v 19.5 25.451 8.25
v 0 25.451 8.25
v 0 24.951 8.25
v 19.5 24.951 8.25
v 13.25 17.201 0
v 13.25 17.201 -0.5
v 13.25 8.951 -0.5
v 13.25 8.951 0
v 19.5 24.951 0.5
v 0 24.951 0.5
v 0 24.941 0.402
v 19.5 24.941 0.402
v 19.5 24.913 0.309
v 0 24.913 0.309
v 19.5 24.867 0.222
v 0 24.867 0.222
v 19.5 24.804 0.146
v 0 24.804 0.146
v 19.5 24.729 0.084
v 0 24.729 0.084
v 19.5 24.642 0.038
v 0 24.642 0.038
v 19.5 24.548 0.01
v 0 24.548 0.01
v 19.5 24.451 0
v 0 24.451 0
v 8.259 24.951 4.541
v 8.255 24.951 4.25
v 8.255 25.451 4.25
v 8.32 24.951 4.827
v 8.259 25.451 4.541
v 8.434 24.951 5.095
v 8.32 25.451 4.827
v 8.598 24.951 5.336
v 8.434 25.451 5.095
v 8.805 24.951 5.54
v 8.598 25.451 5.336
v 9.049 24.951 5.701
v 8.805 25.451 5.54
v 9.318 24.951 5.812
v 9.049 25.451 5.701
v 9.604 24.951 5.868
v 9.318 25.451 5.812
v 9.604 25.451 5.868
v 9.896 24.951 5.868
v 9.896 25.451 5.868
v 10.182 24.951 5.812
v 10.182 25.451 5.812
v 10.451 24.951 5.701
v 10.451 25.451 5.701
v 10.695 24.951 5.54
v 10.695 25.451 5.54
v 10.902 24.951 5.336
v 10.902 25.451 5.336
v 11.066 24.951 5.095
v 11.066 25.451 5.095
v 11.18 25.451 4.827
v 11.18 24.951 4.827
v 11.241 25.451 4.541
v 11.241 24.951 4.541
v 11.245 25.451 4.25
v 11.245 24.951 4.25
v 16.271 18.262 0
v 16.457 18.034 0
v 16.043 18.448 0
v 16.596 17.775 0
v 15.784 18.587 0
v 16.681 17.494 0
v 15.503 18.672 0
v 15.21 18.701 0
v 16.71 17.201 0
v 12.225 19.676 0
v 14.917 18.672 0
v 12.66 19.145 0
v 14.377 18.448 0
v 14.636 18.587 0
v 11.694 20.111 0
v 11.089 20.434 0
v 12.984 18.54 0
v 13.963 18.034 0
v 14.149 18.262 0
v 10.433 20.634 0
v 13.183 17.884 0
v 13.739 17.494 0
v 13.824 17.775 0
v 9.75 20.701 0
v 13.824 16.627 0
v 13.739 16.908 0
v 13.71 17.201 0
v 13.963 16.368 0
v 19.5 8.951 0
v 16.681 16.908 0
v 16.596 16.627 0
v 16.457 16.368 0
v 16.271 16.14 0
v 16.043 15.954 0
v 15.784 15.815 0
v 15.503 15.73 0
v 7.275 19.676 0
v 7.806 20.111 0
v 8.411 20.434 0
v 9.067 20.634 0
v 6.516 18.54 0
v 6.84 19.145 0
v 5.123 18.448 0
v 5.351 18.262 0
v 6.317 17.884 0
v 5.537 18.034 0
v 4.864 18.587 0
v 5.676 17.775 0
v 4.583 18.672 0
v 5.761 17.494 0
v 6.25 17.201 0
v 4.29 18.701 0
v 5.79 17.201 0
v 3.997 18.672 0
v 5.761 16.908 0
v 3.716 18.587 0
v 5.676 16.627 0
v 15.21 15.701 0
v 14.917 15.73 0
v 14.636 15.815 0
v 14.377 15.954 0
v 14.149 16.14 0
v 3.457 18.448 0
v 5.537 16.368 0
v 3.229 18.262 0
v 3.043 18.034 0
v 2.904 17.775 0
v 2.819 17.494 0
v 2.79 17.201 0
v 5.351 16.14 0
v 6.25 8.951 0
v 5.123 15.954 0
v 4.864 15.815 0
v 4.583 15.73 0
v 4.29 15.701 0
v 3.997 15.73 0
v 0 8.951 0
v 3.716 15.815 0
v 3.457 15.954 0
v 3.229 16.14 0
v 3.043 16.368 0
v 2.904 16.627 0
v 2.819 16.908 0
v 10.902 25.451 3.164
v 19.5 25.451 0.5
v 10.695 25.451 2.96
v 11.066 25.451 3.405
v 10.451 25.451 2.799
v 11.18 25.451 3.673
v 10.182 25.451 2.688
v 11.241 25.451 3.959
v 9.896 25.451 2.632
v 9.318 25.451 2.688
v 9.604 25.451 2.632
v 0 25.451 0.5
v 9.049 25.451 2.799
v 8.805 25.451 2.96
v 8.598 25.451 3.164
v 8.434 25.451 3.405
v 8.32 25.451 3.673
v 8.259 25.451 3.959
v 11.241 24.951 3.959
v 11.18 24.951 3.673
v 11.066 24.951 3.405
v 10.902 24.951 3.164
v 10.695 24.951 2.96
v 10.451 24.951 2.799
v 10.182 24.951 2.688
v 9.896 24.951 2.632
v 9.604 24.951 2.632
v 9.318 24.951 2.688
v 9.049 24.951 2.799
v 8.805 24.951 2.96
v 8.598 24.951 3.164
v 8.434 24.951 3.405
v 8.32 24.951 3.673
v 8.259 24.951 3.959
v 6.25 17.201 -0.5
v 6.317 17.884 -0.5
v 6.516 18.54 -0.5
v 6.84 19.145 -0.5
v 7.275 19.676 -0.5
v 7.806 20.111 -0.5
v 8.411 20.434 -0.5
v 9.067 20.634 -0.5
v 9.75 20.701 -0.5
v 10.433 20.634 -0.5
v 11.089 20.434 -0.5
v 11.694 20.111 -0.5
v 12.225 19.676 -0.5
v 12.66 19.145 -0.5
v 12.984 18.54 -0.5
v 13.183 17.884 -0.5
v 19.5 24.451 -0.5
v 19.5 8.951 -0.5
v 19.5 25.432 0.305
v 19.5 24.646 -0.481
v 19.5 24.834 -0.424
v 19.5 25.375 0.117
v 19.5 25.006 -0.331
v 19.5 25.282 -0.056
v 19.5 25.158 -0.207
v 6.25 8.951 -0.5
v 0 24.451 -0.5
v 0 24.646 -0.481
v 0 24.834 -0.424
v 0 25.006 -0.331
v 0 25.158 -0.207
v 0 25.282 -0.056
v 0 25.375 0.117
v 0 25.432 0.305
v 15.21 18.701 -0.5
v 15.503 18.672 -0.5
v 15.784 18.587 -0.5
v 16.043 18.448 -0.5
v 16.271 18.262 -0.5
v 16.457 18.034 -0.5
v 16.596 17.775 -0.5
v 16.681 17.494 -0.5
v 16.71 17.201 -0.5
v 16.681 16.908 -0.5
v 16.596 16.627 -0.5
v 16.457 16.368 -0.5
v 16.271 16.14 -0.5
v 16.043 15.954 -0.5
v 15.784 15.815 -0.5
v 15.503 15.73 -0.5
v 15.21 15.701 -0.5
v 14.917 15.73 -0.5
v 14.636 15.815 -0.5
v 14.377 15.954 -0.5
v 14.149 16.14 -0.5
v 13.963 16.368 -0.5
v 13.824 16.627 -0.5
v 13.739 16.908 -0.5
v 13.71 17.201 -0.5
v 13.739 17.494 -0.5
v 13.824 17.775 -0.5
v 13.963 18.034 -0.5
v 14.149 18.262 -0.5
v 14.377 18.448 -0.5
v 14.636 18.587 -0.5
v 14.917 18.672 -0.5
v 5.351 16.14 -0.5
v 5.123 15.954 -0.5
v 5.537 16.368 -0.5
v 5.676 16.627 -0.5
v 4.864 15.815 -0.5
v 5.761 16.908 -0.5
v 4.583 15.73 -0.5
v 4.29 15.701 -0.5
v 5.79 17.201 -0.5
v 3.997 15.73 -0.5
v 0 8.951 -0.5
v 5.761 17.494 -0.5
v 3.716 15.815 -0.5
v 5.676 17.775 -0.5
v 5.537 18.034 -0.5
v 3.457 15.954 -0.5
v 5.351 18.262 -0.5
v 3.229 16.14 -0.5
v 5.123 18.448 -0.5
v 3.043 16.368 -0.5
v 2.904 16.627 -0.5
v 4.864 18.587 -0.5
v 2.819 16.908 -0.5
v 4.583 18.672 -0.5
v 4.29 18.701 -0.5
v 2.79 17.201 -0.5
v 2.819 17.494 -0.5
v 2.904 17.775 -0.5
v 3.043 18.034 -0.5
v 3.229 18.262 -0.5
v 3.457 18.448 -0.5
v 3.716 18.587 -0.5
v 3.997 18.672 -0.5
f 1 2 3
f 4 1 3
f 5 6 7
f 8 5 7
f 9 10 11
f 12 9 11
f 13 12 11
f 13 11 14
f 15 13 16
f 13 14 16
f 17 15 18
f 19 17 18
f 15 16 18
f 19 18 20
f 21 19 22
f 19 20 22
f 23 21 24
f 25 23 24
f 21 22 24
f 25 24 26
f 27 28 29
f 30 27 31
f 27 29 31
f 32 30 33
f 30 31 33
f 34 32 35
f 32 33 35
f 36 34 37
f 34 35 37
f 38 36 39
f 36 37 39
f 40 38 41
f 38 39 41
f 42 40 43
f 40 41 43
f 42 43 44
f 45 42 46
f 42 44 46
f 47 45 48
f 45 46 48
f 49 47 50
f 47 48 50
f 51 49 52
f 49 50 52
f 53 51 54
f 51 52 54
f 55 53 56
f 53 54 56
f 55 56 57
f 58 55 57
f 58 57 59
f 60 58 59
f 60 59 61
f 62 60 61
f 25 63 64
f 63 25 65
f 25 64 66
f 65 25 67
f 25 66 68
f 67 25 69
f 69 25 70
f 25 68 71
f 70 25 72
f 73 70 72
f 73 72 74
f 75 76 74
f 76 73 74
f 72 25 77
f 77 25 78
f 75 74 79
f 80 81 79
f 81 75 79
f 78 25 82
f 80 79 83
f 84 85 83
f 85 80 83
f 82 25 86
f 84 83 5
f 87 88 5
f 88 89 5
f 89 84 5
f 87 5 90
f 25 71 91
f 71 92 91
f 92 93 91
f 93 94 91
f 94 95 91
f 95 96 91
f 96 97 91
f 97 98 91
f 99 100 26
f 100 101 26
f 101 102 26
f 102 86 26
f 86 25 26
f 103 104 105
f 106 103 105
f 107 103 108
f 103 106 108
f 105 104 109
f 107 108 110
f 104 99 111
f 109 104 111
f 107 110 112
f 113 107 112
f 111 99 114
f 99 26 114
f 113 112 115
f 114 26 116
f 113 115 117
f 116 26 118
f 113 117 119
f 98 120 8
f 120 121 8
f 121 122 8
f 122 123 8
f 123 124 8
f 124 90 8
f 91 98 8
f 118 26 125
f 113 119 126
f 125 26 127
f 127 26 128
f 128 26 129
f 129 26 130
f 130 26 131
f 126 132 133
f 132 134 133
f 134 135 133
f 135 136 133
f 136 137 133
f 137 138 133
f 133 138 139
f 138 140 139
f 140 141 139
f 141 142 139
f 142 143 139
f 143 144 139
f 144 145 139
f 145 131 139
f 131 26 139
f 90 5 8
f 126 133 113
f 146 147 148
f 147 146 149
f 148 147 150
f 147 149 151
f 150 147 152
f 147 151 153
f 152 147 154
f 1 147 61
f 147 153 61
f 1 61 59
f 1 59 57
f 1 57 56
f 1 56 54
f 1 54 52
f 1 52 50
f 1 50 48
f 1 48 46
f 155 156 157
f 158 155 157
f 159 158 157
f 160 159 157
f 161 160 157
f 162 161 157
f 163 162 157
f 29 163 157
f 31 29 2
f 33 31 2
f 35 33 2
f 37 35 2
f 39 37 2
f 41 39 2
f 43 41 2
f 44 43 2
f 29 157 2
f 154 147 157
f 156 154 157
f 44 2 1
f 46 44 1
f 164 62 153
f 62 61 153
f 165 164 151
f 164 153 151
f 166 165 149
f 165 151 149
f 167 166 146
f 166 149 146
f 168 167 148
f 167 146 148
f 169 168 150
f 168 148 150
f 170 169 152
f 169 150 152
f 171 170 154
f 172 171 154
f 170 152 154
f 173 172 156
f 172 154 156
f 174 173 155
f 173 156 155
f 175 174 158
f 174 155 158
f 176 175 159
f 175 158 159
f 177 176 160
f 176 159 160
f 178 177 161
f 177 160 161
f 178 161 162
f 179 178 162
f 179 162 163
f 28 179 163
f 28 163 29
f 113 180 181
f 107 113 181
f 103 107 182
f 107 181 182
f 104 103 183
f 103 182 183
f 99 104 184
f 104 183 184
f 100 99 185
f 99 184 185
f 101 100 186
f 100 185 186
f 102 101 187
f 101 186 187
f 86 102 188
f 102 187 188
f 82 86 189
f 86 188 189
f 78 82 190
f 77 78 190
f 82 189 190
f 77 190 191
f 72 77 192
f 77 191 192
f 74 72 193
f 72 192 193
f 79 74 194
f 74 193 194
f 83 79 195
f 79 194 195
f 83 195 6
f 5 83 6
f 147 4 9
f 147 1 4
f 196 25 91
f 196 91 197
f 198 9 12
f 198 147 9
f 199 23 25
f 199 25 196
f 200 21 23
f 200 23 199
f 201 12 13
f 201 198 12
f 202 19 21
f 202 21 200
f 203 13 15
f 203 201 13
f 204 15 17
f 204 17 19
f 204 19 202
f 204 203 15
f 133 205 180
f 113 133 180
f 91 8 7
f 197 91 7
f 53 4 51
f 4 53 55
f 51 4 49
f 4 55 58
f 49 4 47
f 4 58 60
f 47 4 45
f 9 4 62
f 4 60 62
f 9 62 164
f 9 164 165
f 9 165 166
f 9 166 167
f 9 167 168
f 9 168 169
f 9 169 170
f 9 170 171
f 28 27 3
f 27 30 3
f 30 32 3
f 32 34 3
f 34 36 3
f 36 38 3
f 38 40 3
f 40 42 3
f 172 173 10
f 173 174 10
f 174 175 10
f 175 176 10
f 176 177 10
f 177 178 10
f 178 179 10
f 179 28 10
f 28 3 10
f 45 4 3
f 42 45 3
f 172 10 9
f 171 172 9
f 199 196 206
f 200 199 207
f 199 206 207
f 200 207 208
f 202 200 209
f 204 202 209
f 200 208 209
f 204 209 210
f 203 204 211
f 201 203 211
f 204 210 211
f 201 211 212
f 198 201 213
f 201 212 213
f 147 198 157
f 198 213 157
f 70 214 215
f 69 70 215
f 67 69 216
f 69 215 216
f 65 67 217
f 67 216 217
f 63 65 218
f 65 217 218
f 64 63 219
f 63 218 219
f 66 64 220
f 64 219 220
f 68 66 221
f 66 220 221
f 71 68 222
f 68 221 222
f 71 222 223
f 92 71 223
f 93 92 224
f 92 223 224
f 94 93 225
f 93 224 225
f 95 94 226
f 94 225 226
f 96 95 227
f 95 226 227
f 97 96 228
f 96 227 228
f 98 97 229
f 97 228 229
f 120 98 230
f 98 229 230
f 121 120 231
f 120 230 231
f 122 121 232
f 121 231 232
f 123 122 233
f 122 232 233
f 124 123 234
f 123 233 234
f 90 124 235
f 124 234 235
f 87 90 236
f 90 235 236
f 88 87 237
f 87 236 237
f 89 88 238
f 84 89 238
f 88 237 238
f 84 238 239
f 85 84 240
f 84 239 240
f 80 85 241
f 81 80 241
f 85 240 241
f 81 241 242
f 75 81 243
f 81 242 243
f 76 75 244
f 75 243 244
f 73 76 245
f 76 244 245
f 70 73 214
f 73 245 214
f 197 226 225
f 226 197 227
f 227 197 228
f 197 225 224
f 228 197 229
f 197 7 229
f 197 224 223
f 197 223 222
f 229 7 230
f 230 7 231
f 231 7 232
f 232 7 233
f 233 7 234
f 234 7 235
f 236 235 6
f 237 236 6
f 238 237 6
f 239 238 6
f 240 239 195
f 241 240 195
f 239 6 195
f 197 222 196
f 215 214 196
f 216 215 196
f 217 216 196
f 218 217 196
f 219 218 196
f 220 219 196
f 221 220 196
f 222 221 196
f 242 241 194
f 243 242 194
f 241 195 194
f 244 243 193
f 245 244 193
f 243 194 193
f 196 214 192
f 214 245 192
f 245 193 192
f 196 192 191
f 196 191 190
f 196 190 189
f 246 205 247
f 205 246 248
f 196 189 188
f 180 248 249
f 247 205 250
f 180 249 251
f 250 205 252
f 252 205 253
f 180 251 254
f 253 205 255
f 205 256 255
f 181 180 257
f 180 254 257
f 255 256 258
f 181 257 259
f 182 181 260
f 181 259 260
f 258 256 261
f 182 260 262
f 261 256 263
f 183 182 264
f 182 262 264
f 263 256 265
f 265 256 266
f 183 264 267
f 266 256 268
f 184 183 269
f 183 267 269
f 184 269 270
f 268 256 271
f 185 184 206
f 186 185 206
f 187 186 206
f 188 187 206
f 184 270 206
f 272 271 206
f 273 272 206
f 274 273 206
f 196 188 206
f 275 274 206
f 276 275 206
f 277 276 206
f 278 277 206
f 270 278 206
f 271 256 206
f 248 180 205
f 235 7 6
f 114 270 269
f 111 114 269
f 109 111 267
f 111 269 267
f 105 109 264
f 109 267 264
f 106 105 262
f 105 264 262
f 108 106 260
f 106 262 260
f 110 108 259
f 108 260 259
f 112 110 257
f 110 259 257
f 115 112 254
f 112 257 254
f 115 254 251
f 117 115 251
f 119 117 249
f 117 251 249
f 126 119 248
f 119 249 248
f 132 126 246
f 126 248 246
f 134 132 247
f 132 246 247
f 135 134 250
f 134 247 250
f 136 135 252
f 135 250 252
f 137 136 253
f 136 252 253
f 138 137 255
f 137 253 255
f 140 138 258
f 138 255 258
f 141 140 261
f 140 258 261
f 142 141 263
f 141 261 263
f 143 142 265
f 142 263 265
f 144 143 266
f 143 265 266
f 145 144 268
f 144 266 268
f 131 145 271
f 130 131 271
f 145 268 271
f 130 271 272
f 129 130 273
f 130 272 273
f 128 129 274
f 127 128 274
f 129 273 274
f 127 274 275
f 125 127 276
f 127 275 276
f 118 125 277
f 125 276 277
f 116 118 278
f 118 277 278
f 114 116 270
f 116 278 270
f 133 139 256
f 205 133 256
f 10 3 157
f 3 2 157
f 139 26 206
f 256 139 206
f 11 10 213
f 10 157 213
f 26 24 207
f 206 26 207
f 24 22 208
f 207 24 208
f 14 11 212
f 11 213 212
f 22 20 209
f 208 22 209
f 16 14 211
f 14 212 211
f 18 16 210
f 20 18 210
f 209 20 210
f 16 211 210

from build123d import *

# Parameters (mm, degrees)
BRIDA_BASE1_DEPTH     = 19.5
CROQUIS9_R            = 1.5
CORTAR_EXTRUIR4_DEPTH = 0.5
CROQUIS10_R           = 1.5
CORTAR_EXTRUIR5_DEPTH = 0.5
CROQUIS8_R            = 1.5
CORTAR_EXTRUIR3_DEPTH = 10


# Sheet-metal steps are written as plain solids
with BuildPart() as part:
    # Croquis1 → Brida base1 (new body)
    with BuildSketch(Plane(origin=(0, 0, 0), x_dir=(0, 0, -1), z_dir=(1, 0, 0))):
        with BuildLine():
            Line((-8.25, 24.950879865), (-0.5, 24.950879865))
            ThreePointArc((-0.5, 24.950879865), (-0.146446609, 24.804433255), (0, 24.450879865))
            Line((0, 24.450879865), (0, 8.950879865))
            Line((0, 8.950879865), (0.5, 8.950879865))
            Line((0.5, 8.950879865), (0.5, 24.450879865))
            ThreePointArc((0.5, 24.450879865), (0.207106781, 25.157986646), (-0.5, 25.450879865))
            Line((-0.5, 25.450879865), (-8.25, 25.450879865))
            Line((-8.25, 25.450879865), (-8.25, 24.950879865))
        make_face()
    extrude(amount=BRIDA_BASE1_DEPTH)

    # Croquis9 → Cortar-Extruir4 (cut)
    with BuildSketch(Plane(origin=(0, 0, -0.5), x_dir=(-1, 0, 0), z_dir=(0, 0, -1))):
        with BuildLine():
            ThreePointArc((-6.25, 17.200879865), (-9.75, 20.700879865), (-13.25, 17.200879865))
            Line((-13.25, 17.200879865), (-13.25, 8.950879865))
            Line((-13.25, 8.950879865), (-6.25, 8.950879865))
            Line((-6.25, 8.950879865), (-6.25, 17.200879865))
        make_face()
        with Locations(Location((-15.21, 17.200879865, 0), (0, 0, 90))):
            Circle(CROQUIS9_R)
        with Locations(Location((-4.29, 17.200879865, 0), (0, 0, 90))):
            Circle(CROQUIS9_R)
    extrude(amount=-CORTAR_EXTRUIR4_DEPTH, mode=Mode.SUBTRACT)

    # Croquis10 → Cortar-Extruir5 (cut)
    with BuildSketch(Plane(origin=(0, 25.450879865, 0), x_dir=(1, 0, 0), z_dir=(0, 1, 0))):
        with Locations(Location((9.75, -4.375, 0), (0, 0, 270))):
            Circle(CROQUIS10_R)
    extrude(amount=-CORTAR_EXTRUIR5_DEPTH, mode=Mode.SUBTRACT)

    # Croquis8 → Cortar-Extruir3 (cut)
    with BuildSketch(Plane(origin=(0, 25.450879865, 0), x_dir=(1, 0, 0), z_dir=(0, 1, 0))):
        with Locations((9.75, -4.125)):
            Circle(CROQUIS8_R)
    extrude(amount=-CORTAR_EXTRUIR3_DEPTH, mode=Mode.SUBTRACT)


solid = part.part
